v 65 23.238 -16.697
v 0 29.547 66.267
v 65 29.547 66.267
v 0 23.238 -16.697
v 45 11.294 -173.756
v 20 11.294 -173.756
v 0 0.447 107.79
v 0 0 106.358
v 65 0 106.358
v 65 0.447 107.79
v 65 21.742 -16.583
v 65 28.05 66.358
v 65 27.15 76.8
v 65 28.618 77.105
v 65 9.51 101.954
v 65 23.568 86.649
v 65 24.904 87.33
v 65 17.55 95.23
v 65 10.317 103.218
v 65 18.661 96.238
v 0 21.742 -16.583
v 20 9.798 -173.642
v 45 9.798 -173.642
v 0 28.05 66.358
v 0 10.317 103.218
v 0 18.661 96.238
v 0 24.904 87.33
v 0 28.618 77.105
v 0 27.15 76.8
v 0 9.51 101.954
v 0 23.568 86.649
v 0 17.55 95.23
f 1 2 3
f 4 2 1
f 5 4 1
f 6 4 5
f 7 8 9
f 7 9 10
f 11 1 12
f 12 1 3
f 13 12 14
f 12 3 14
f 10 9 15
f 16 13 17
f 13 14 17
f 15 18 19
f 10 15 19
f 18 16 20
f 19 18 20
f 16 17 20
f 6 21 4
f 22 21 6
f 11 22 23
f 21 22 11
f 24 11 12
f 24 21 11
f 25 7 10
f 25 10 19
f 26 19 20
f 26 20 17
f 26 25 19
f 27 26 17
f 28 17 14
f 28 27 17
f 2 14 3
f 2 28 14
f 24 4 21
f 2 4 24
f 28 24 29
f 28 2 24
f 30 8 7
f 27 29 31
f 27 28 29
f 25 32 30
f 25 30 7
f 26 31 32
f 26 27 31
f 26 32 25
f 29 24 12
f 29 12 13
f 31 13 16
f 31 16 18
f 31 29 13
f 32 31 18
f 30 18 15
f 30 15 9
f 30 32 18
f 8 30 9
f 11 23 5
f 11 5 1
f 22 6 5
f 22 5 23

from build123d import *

# Parameters (mm, degrees)
EXTRUDE_THIN2_DEPTH     = 65
CUT_EXTRUDE3_DEPTH      = 186.389784583
CUT_EXTRUDE3_DEPTH_BACK = 186.389784583
CUT_EXTRUDE4_DEPTH      = 186.389784583
CUT_EXTRUDE4_DEPTH_BACK = 186.389784583


with BuildPart() as part:
    # Sketch1 → Extrude-Thin2 (new body)
    with BuildSketch(Plane(origin=(0, 0, 0), x_dir=(0, 0, -1), z_dir=(1, 0, 0))):
        with BuildLine():
            Line((173.642321834, 9.797958971), (-66.357678166, 28.050095))
            ThreePointArc((-66.357678166, 28.050095), (-91.137548283, 20.841238484), (-106.357678166, 0))
            Line((-106.357678166, 0), (-107.789658514, 0.446578419))
            ThreePointArc((-107.789658514, 0.446578419), (-91.989308326, 22.075999038), (-66.266563175, 29.547497166))
            Line((-66.266563175, 29.547497166), (173.756069218, 11.293639931))
            Line((173.756069218, 11.293639931), (173.642321834, 9.797958971))
        make_face()
    extrude(amount=EXTRUDE_THIN2_DEPTH)

    # Sketch2 → Cut-Extrude3 (cut, two sides: drawn at the far end of the back side and taken through both)
    with BuildSketch(Plane(origin=(0, 24.366956586, -1.853120859), x_dir=(1, 0, 0), z_dir=(0, 0.9971206396362033, -0.07583158979929651)).offset(-CUT_EXTRUDE3_DEPTH_BACK)):
        Polygon((93.231917992, 749.14649506), (20, 172.399348209), (0, 14.886842005), (-73.231917992, -561.860304846), (-1226.726211693, -415.396468862), (-1060.262375709, 895.610331043), align=None)
    extrude(amount=CUT_EXTRUDE3_DEPTH + CUT_EXTRUDE3_DEPTH_BACK, mode=Mode.SUBTRACT)

    # Sketch4 → Cut-Extrude4 (cut, two sides: drawn at the far end of the back side and taken through both)
    with BuildSketch(Plane(origin=(0, 24.366956586, -1.853120859), x_dir=(1, 0, 0), z_dir=(0, 0.9971206396362033, -0.07583158979929651)).offset(-CUT_EXTRUDE4_DEPTH_BACK)):
        Polygon((-28.231917992, 749.14649506), (45, 172.399348209), (65, 14.886842005), (138.231917992, -561.860304846), (1291.726211693, -415.396468862), (1125.262375709, 895.610331043), align=None)
    extrude(amount=CUT_EXTRUDE4_DEPTH + CUT_EXTRUDE4_DEPTH_BACK, mode=Mode.SUBTRACT)


solid = part.part
